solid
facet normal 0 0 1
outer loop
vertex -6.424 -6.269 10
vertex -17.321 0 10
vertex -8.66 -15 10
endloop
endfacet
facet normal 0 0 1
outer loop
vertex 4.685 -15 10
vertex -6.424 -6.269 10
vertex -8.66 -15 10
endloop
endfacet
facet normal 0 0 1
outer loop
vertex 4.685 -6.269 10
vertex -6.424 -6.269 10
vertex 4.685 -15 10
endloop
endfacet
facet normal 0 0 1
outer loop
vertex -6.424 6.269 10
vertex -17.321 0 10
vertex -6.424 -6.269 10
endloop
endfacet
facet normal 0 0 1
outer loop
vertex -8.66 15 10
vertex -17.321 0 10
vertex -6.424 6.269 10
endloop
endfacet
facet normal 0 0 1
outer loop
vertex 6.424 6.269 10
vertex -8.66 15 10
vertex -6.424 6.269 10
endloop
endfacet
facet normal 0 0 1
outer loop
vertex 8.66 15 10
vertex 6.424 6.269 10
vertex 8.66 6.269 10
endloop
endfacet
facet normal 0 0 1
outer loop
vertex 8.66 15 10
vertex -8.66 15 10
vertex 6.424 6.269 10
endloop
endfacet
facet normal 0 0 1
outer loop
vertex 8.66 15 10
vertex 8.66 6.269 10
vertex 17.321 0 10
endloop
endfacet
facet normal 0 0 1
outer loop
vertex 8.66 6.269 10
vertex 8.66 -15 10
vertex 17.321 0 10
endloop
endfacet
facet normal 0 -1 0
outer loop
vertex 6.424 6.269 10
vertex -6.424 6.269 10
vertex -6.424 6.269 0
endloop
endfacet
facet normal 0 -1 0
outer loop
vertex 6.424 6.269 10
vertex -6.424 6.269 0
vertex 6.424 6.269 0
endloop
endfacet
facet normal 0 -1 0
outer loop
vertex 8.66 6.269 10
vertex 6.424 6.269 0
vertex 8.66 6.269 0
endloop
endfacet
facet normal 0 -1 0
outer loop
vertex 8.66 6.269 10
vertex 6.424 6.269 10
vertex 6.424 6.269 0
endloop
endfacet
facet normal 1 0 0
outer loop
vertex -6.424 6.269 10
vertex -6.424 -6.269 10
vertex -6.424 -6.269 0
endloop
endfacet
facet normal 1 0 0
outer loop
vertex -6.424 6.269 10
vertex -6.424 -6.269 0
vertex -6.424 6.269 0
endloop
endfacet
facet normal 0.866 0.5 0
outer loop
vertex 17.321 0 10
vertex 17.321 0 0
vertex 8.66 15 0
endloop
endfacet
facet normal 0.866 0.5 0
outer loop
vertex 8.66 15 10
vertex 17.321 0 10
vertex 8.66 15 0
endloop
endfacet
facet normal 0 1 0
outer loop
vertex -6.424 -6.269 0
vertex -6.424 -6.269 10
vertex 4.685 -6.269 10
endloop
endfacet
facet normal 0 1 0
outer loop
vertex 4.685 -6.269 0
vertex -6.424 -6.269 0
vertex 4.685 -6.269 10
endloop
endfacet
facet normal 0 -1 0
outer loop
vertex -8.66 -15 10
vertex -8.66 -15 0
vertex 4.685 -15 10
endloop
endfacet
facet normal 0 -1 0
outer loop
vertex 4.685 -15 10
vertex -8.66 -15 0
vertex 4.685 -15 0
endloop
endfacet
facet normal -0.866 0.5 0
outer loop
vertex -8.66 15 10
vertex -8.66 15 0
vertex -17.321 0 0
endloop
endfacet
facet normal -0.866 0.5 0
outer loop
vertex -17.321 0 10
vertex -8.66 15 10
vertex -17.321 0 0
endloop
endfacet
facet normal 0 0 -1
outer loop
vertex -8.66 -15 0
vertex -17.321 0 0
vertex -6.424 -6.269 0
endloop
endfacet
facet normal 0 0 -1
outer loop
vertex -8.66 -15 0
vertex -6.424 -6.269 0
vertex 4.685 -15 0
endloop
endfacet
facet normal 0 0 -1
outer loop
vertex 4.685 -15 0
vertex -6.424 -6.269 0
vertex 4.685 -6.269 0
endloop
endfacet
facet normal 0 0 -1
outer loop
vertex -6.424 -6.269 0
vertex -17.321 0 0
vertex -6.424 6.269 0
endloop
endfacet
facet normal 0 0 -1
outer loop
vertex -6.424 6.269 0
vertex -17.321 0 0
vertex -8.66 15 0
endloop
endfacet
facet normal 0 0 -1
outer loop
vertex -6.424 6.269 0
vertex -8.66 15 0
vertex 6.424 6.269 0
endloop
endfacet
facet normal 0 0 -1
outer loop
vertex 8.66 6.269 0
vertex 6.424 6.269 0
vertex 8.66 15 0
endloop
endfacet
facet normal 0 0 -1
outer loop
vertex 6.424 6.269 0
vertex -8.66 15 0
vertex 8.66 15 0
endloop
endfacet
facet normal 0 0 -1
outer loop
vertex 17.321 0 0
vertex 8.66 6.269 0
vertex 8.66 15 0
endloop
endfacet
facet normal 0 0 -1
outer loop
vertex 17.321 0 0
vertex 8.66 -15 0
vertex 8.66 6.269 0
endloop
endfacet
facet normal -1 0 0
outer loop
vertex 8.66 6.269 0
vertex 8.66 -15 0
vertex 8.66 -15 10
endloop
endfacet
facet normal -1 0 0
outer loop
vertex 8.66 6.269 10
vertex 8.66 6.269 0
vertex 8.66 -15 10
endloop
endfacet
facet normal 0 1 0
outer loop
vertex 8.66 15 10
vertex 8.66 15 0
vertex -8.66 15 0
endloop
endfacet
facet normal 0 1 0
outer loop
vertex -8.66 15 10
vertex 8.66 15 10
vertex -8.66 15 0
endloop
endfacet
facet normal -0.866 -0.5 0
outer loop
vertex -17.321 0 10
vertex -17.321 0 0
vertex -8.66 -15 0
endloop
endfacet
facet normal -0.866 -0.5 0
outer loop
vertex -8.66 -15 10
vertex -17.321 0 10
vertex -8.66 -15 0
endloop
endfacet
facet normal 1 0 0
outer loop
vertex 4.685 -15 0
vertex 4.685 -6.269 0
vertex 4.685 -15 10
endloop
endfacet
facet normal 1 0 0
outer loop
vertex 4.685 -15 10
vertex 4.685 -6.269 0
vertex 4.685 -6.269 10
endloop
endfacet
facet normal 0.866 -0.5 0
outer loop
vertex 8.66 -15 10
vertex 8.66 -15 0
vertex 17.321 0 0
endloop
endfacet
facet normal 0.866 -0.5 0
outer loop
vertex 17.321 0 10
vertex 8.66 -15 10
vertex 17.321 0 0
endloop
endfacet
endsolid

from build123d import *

# Parameters (mm, degrees)
BOSS_EXTRUDE1_DEPTH = 10
SKETCH2_W           = 12.8478013
SKETCH2_H           = 12.538959922
CUT_EXTRUDE1_DEPTH  = 11
CUT_EXTRUDE3_START  = -21.26948
SKETCH3_W           = 3.975573171
SKETCH3_H           = 10
CUT_EXTRUDE3_DEPTH  = 21.26948


with BuildPart() as part:
    # Sketch1 → Boss-Extrude1 (new body)
    with BuildSketch(Plane.XY):
        Polygon((17.320508076, 0), (8.660254038, 15), (-8.660254038, 15), (-17.320508076, 0), (-8.660254038, -15), (8.660254038, -15), align=None)
    extrude(amount=BOSS_EXTRUDE1_DEPTH)

    # Sketch2 → Cut-Extrude1 (cut, through all)
    with BuildSketch(Plane.XY.offset(10)):
        Rectangle(SKETCH2_W, SKETCH2_H)
    extrude(amount=-CUT_EXTRUDE1_DEPTH, mode=Mode.SUBTRACT)

    # Sketch3 → Cut-Extrude3 (cut)
    with BuildSketch(Plane.XZ.offset(15).offset(CUT_EXTRUDE3_START)):
        with Locations((6.672467452, 5)):
            Rectangle(SKETCH3_W, SKETCH3_H)
    extrude(amount=CUT_EXTRUDE3_DEPTH, mode=Mode.SUBTRACT)


solid = part.part
